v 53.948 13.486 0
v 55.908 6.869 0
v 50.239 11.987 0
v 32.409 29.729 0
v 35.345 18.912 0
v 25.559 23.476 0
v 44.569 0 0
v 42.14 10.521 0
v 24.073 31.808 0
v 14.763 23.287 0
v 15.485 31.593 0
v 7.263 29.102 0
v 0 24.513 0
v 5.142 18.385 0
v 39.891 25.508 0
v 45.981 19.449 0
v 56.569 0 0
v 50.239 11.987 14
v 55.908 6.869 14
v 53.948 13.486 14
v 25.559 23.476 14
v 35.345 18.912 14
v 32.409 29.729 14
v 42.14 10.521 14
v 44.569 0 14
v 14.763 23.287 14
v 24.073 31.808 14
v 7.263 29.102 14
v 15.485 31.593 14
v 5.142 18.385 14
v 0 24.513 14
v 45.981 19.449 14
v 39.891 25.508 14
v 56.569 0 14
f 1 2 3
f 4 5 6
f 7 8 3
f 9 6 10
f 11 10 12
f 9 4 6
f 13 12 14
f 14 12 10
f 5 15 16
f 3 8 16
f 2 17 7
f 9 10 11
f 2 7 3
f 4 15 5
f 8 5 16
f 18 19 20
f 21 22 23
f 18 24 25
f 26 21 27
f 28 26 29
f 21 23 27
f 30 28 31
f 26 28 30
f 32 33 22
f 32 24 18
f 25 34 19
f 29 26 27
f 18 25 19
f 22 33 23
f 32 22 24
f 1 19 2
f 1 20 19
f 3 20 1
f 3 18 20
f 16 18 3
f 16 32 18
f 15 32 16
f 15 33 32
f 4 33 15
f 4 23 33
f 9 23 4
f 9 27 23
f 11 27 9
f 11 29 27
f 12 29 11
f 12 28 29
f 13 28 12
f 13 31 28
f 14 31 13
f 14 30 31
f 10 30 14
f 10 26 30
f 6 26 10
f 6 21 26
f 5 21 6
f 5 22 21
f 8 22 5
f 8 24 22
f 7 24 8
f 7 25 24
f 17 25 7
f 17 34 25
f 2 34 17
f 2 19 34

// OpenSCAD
$fn = 32;

// ----------------------------------------------------------------------
// Arc stop: segment, 14 mm thick
// ----------------------------------------------------------------------

// --- parameters (mm) ---
profile_height = 14;      // extrusion height
profile_points = 17;      // points of the closed outline

profile = [[56.569, 0], [55.908, 6.869], [53.948, 13.486], [50.239, 11.987], [45.981, 19.449], [39.891, 25.508], [32.409, 29.729], [24.073, 31.808], [15.485, 31.593], [7.263, 29.102], [0, 24.513], [5.142, 18.385], [14.763, 23.287], [25.559, 23.476], [35.345, 18.912], [42.14, 10.521], [44.569, 0]];  // single closed polygon, 17 points, counter clockwise

// --- the one profile operation ---
linear_extrude(height = profile_height) polygon(points = profile);
